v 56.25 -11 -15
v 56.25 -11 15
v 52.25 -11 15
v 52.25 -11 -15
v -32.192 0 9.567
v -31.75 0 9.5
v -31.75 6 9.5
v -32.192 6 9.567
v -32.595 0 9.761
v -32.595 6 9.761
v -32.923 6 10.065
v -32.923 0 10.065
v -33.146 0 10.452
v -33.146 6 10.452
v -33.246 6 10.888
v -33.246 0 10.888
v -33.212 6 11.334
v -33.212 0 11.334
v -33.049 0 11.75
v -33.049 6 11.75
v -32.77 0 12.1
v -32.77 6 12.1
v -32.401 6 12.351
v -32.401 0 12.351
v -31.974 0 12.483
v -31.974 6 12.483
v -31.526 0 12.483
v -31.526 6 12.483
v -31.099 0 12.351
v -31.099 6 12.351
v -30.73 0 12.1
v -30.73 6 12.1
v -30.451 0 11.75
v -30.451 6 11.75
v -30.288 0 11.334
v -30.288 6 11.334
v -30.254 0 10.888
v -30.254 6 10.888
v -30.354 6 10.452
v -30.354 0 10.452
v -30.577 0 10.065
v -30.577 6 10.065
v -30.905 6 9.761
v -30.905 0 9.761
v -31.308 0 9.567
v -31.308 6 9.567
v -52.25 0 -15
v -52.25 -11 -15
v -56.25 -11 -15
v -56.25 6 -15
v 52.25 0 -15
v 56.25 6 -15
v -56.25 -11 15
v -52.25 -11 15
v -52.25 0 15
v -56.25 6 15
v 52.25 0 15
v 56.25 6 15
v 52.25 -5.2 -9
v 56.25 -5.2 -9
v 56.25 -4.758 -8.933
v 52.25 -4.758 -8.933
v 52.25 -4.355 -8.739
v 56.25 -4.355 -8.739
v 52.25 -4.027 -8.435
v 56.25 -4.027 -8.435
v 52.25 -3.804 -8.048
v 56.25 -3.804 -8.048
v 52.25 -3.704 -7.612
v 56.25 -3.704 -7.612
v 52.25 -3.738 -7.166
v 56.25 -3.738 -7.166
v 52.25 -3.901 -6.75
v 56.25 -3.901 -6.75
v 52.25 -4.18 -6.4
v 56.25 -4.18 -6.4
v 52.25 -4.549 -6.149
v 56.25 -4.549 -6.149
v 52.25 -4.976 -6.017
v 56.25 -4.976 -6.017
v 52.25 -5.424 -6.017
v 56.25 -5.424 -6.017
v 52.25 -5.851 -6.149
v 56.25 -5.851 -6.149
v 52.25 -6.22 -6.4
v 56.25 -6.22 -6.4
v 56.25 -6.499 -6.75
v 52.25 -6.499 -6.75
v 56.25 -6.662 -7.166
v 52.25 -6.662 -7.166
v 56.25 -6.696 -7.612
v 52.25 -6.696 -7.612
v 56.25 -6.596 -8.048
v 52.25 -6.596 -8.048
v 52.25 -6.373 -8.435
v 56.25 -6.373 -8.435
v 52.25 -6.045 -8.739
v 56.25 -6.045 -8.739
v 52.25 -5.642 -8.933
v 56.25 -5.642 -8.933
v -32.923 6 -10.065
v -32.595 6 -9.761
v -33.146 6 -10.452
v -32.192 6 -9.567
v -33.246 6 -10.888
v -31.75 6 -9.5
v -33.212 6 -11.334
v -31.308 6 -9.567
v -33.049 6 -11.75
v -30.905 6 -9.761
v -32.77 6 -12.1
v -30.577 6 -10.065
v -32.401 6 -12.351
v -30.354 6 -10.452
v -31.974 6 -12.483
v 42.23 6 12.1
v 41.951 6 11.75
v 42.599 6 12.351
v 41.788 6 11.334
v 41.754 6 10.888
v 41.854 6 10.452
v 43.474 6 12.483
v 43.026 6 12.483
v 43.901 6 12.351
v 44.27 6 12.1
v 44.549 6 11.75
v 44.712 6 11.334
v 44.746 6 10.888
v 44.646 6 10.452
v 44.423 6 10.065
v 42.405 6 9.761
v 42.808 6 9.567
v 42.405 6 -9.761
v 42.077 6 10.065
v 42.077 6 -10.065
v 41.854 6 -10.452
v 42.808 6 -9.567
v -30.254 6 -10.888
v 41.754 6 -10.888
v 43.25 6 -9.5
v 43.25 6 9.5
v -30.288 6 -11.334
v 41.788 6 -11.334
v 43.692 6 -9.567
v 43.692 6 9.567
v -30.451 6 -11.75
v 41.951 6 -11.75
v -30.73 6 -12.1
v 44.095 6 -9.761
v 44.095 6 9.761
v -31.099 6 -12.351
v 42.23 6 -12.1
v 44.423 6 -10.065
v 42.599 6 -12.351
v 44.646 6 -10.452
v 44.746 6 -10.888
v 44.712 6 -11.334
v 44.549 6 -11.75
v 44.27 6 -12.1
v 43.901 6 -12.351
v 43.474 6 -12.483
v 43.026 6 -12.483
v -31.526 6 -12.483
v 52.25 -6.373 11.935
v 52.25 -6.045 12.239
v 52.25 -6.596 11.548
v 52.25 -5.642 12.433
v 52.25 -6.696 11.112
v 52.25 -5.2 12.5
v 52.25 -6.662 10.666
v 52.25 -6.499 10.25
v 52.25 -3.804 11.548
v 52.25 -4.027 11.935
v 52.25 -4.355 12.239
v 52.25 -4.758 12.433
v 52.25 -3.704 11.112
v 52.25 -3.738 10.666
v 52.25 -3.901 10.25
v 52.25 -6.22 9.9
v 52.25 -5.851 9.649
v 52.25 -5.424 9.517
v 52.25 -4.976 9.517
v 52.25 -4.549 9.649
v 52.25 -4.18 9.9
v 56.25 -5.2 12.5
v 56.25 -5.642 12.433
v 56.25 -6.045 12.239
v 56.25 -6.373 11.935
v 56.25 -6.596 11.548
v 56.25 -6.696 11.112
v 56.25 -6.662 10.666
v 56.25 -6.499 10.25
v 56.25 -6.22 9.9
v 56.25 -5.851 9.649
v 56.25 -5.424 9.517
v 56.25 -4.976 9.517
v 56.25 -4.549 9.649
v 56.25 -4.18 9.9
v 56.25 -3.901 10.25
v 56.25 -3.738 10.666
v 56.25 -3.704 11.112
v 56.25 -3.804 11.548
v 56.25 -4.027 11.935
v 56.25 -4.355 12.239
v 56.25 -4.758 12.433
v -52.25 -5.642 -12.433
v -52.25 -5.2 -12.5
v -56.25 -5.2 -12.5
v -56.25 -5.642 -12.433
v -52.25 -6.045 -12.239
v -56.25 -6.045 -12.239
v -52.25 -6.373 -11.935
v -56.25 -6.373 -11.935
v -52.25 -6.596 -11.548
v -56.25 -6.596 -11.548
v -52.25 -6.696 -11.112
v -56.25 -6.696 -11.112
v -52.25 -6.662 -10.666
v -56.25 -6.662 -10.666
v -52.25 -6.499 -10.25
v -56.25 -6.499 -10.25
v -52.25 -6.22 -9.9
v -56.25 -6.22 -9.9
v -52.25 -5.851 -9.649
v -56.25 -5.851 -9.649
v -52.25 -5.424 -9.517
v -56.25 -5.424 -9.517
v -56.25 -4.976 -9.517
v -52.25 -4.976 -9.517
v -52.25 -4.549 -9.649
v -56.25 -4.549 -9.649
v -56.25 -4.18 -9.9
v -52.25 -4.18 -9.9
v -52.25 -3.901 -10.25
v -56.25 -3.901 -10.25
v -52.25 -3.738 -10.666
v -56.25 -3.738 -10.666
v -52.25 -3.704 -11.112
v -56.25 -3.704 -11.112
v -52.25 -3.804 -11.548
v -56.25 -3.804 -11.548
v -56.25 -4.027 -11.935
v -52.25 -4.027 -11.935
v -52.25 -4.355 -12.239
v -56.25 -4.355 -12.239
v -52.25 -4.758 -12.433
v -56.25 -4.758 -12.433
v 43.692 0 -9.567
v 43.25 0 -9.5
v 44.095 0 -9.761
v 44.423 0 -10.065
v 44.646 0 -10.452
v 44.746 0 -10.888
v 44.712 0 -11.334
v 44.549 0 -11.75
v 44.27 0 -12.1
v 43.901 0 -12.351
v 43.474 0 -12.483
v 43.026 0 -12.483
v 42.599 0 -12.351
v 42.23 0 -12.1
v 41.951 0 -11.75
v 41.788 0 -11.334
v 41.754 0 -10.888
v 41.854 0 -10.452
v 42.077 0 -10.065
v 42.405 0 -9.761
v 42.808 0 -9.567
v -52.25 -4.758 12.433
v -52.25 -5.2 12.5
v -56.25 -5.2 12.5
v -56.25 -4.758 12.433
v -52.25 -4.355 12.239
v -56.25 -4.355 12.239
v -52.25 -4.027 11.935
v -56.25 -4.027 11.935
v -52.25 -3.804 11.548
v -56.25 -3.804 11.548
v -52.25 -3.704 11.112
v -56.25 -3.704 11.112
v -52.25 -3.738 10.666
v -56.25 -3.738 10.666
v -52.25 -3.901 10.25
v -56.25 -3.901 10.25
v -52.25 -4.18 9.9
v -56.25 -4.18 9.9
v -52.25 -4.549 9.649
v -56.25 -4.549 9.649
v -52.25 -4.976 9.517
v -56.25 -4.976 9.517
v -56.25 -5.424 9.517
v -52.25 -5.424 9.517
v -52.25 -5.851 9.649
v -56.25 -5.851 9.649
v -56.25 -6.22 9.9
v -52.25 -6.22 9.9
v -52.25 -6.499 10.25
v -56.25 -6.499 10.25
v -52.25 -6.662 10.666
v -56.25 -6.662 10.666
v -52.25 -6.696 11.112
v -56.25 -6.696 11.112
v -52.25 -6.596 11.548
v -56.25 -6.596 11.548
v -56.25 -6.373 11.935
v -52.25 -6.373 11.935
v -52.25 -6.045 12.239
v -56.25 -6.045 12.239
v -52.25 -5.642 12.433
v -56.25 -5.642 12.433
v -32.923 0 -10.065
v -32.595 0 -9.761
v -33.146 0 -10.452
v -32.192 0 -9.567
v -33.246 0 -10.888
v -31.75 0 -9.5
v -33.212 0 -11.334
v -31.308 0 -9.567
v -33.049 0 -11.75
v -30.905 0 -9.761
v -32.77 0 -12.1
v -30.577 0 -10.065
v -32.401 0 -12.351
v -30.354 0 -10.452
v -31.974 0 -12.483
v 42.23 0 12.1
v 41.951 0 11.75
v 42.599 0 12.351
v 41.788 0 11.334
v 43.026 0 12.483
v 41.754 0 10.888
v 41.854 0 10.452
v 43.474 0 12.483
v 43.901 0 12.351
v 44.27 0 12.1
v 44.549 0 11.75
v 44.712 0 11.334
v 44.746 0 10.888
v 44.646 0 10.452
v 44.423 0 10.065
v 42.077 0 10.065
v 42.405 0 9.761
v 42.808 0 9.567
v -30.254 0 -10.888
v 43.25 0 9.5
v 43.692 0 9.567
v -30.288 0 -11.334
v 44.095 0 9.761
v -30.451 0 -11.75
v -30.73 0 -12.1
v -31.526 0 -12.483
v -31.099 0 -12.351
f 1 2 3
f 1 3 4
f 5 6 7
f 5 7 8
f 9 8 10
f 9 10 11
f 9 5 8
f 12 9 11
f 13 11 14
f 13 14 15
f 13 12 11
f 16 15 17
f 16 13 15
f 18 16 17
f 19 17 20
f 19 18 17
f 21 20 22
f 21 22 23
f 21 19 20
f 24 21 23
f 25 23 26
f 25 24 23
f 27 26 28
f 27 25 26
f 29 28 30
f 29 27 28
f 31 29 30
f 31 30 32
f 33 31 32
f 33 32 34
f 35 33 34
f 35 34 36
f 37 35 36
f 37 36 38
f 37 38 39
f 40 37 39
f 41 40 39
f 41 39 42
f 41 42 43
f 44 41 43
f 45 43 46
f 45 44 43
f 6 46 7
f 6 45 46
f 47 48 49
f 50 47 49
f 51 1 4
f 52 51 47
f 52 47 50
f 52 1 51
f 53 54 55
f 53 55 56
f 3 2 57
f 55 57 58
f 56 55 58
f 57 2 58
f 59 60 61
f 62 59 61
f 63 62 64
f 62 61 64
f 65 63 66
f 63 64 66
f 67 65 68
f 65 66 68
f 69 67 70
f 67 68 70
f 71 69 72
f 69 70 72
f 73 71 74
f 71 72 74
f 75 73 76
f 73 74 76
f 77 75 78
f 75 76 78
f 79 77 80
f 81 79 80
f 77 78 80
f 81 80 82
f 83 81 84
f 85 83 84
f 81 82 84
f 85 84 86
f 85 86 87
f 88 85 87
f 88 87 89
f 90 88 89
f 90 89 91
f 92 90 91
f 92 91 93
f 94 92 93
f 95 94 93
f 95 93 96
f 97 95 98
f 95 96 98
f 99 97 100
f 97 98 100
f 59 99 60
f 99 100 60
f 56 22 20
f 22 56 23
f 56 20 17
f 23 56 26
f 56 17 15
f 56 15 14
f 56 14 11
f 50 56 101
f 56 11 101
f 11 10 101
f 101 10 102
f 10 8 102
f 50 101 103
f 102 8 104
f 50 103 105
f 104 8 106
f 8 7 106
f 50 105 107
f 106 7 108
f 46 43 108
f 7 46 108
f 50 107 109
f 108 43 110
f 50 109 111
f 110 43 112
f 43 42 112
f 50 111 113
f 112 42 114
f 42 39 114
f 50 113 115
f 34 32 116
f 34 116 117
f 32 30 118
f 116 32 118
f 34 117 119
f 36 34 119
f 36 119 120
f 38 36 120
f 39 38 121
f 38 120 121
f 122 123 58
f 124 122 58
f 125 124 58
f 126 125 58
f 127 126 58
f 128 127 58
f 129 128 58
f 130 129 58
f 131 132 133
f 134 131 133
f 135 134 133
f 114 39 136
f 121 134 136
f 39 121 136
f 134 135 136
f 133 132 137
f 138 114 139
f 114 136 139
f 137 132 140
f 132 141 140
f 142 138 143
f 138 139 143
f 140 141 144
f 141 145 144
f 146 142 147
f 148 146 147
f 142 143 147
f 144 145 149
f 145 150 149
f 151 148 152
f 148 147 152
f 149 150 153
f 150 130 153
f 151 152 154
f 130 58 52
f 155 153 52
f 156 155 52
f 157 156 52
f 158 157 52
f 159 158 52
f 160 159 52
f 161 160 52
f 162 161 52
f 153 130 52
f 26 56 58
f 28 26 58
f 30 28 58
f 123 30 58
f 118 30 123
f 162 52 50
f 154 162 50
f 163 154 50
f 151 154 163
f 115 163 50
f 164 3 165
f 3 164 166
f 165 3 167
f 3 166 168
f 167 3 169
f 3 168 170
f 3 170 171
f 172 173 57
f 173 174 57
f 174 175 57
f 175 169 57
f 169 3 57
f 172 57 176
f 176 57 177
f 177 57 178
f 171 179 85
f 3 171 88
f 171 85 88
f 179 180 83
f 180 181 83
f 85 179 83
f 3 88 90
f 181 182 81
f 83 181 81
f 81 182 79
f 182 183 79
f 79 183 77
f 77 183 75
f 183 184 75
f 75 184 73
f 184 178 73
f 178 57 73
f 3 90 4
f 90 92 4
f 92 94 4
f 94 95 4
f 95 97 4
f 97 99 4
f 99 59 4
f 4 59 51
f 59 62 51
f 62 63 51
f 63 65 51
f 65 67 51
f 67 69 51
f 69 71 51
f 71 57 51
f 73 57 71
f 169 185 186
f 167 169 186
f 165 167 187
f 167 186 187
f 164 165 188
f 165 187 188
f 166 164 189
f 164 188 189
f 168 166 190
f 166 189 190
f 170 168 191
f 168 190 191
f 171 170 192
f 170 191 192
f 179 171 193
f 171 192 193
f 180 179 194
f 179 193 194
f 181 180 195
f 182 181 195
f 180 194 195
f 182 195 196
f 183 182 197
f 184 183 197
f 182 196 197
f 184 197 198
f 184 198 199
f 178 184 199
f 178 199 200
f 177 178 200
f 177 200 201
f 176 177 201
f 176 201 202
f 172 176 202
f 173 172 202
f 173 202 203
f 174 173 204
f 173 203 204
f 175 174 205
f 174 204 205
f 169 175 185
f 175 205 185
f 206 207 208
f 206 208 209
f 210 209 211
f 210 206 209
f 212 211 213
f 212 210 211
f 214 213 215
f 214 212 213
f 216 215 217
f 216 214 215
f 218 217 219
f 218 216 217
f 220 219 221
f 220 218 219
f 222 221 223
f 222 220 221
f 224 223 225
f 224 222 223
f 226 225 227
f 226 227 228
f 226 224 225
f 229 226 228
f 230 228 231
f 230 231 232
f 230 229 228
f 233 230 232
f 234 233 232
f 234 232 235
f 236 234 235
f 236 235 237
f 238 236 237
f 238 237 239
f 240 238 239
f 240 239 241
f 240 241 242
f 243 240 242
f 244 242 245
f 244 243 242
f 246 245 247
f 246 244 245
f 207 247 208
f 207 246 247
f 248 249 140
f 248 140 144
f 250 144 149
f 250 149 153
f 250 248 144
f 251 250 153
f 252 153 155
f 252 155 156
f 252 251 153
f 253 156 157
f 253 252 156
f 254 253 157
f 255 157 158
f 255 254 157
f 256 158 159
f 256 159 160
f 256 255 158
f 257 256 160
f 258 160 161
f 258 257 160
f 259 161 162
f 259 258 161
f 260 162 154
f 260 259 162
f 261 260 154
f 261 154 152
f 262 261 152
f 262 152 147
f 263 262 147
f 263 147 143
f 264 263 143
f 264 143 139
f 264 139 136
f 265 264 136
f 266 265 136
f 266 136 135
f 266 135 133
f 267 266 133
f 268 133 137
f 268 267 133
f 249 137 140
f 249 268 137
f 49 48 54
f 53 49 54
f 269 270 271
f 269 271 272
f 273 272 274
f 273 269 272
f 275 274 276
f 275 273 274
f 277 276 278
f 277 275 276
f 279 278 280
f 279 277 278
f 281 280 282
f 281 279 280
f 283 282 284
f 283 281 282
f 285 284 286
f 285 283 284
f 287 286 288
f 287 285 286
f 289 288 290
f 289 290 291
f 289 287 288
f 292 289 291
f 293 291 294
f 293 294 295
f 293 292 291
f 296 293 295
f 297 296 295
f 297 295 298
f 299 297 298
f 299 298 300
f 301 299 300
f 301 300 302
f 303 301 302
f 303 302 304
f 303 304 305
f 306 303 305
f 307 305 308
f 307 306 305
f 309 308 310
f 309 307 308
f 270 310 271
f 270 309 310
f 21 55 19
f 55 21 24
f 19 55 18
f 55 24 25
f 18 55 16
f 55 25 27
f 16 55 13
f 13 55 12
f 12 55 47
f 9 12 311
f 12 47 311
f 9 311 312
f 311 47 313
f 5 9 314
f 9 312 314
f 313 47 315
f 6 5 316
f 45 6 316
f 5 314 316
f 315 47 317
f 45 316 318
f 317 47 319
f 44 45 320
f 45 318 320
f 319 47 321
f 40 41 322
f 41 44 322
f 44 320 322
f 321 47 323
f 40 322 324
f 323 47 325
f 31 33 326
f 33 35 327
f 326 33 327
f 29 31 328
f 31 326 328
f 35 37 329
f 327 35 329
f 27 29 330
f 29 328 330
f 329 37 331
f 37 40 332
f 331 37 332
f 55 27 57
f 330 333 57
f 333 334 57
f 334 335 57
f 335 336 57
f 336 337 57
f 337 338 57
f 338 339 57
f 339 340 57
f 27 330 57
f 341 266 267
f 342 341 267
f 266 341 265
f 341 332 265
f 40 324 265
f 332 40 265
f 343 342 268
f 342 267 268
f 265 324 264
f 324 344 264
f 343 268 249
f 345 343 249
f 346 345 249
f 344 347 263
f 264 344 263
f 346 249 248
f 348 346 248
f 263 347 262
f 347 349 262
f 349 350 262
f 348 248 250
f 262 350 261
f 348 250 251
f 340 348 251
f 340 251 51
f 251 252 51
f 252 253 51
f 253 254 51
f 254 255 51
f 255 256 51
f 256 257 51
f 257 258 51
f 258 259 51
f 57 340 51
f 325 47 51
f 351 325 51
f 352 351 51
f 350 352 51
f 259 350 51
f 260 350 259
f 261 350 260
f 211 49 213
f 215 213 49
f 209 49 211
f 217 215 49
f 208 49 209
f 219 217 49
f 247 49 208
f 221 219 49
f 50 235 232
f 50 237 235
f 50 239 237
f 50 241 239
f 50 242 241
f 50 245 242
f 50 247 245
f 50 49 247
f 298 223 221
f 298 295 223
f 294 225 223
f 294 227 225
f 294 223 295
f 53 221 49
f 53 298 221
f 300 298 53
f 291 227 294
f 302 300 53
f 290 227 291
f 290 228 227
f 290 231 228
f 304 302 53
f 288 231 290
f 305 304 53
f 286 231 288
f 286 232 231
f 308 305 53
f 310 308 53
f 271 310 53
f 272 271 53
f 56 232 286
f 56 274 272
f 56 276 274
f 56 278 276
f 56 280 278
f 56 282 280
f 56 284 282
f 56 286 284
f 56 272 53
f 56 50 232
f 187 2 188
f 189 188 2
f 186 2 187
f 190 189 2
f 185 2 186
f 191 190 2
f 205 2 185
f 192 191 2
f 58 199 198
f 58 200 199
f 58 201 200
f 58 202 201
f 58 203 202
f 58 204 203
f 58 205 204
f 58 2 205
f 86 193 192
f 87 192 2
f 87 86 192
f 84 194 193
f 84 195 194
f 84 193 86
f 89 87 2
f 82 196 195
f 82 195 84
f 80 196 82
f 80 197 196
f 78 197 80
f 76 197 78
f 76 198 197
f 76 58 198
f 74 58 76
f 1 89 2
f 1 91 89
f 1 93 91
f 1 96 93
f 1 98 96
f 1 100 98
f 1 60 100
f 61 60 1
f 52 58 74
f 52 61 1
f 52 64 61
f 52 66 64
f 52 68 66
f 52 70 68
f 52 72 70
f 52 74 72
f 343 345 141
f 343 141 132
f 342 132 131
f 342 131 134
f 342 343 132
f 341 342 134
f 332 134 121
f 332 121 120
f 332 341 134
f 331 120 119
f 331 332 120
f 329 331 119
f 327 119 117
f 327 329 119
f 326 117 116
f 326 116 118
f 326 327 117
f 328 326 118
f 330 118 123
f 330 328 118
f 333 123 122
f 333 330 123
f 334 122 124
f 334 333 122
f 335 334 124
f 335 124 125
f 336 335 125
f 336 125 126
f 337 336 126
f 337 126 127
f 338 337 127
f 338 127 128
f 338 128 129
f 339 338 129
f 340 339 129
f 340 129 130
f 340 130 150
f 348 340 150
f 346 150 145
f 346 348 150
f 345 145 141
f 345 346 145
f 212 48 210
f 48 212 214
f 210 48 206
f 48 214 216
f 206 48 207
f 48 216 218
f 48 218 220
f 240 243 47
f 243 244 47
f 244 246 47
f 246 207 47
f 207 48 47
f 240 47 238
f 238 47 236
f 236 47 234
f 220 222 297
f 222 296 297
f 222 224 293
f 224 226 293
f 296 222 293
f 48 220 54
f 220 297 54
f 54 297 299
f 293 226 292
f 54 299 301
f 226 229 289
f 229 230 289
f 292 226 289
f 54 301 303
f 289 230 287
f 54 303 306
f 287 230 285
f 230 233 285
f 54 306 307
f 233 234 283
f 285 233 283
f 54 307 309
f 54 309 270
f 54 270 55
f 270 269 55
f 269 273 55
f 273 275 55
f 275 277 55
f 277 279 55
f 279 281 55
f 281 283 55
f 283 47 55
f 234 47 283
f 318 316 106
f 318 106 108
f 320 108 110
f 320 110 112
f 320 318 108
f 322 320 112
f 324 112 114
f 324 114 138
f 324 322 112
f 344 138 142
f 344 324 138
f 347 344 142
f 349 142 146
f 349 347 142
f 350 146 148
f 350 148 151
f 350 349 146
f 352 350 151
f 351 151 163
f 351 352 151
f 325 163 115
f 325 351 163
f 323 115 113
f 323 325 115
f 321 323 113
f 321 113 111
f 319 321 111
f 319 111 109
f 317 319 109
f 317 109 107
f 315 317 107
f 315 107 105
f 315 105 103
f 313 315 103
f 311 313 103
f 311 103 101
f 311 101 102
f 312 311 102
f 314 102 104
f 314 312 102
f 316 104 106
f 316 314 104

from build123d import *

# Parameters (mm, degrees)
SKETCH_1_W      = 104.5
SKETCH_1_H      = 30
SKETCH_1_R      = 1.5
EXTRUDE_1_DEPTH = 6
SKETCH_2_W      = 30
SKETCH_2_H      = 17
SKETCH_2_R      = 1.5
EXTRUDE_2_DEPTH = 4
EXTRUDE_START   = 4
SKETCH_3_W      = 30
SKETCH_3_H      = 17
SKETCH_3_R      = 1.5
EXTRUDE_3_DEPTH = 4


with BuildPart() as part:
    # 草图1 → 凸台-拉伸1 (new body)
    with BuildSketch(Plane(origin=(0, 0, 0), x_dir=(1, 0, 0), z_dir=(0, 1, 0))):
        Rectangle(SKETCH_1_W, SKETCH_1_H)
        with Locations(Location((-31.75, 11, 0), (0, 0, 270))):
            Circle(SKETCH_1_R, mode=Mode.SUBTRACT)
        with Locations(Location((43.25, 11, 0), (0, 0, 270))):
            Circle(SKETCH_1_R, mode=Mode.SUBTRACT)
        with Locations(Location((43.25, -11, 0), (0, 0, 90))):
            Circle(SKETCH_1_R, mode=Mode.SUBTRACT)
        with Locations(Location((-31.75, -11, 0), (0, 0, 90))):
            Circle(SKETCH_1_R, mode=Mode.SUBTRACT)
    extrude(amount=EXTRUDE_1_DEPTH)

    # 草图2 → 凸台-拉伸2 (add)
    with BuildSketch(Plane.ZY.offset(52.25)):
        with Locations((0, -2.5)):
            Rectangle(SKETCH_2_W, SKETCH_2_H)
        with Locations((11, -5.2)):
            Circle(SKETCH_2_R, mode=Mode.SUBTRACT)
        with Locations(Location((-11, -5.2, 0), (0, 0, 180))):
            Circle(SKETCH_2_R, mode=Mode.SUBTRACT)
    extrude(amount=EXTRUDE_2_DEPTH)

    # 草图3 → 凸台-拉伸3 (add)
    with BuildSketch(Plane(origin=(52.25, 0, 0), x_dir=(0, 0, -1), z_dir=(1, 0, 0)).offset(EXTRUDE_START)):
        with Locations((0, -2.5)):
            Rectangle(SKETCH_3_W, SKETCH_3_H)
        with Locations(Location((-11, -5.2, 0), (0, 0, 180))):
            Circle(SKETCH_3_R, mode=Mode.SUBTRACT)
        with Locations((7.5, -5.2)):
            Circle(SKETCH_3_R, mode=Mode.SUBTRACT)
    extrude(amount=-EXTRUDE_3_DEPTH)


solid = part.part
